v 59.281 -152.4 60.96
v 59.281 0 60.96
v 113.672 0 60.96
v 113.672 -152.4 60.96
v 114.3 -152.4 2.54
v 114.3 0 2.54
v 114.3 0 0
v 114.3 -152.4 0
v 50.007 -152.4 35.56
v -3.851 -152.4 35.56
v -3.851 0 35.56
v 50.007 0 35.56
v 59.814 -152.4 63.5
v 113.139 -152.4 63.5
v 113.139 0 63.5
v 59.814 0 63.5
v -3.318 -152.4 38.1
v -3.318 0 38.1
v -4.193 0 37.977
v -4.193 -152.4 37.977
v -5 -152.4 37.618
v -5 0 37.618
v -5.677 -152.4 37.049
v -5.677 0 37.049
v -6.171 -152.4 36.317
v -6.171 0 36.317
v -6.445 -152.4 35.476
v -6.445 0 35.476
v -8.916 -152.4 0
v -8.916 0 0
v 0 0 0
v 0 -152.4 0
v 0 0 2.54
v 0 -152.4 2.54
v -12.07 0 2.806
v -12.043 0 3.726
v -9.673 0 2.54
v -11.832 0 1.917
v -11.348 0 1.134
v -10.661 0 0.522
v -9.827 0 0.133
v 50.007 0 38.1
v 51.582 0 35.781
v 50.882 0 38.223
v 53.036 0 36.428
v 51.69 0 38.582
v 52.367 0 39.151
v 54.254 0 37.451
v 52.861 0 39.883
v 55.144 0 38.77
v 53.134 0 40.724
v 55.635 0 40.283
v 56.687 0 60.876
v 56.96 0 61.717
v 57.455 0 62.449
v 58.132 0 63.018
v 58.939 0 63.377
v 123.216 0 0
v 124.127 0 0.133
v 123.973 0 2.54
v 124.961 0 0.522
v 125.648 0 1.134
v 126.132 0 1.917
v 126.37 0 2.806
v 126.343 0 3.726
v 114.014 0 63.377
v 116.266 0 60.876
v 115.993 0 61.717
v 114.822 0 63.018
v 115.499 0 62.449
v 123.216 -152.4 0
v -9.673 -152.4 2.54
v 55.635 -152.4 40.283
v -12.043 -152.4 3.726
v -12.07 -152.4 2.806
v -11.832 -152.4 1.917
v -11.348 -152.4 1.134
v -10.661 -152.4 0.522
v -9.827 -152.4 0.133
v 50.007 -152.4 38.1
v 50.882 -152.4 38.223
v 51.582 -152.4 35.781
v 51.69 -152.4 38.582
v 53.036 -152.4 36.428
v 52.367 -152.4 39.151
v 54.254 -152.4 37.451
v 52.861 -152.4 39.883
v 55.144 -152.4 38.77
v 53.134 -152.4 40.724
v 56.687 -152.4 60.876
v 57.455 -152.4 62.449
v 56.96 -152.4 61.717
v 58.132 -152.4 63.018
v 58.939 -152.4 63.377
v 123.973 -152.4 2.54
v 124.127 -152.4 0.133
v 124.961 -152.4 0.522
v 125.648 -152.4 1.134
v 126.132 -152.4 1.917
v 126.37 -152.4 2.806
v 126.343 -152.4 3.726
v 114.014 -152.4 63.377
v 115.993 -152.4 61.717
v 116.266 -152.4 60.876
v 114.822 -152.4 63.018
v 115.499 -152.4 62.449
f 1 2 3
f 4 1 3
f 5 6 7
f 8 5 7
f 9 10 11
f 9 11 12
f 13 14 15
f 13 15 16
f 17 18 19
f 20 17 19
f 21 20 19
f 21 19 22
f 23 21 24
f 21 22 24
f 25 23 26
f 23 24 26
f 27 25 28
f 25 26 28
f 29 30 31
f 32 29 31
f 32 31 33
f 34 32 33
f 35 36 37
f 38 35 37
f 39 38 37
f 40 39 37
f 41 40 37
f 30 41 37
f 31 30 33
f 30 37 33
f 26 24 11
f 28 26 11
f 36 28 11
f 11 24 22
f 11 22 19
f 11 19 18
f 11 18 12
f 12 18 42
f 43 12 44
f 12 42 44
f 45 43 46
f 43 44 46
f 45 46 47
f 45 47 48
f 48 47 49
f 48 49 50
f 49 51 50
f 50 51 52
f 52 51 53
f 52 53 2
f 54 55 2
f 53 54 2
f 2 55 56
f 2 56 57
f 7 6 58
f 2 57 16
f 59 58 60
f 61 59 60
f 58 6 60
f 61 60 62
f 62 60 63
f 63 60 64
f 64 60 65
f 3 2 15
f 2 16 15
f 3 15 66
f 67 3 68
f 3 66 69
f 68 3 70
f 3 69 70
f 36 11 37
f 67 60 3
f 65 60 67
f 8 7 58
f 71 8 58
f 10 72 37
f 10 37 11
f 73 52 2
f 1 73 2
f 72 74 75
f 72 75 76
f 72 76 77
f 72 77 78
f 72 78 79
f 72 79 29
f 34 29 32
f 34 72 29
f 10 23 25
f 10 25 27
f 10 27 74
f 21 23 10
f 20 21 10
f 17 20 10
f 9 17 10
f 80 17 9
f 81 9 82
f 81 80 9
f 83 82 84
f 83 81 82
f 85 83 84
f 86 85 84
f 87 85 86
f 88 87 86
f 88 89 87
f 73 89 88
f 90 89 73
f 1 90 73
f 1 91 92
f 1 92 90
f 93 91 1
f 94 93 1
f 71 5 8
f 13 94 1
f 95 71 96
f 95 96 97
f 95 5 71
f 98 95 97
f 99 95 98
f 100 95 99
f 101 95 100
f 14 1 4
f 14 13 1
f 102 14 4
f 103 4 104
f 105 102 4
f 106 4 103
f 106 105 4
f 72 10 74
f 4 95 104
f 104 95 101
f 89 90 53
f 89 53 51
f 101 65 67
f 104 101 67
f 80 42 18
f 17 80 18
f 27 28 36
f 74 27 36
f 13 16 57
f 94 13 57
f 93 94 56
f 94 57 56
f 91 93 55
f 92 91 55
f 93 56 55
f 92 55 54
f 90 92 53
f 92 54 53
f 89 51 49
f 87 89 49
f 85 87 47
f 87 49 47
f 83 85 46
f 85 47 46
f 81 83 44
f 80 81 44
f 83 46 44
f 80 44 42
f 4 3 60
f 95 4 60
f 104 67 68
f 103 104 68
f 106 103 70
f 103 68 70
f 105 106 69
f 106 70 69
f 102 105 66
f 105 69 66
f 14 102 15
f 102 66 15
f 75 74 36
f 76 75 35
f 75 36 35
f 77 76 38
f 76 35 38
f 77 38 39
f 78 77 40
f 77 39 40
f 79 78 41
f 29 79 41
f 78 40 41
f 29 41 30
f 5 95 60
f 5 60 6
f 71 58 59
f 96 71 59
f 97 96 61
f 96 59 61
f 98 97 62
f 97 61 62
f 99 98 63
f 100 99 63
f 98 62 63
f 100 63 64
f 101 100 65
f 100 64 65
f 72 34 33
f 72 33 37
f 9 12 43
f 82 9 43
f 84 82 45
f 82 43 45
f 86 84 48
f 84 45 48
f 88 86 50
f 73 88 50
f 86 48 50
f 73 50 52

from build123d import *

# Parameters (mm, degrees)
F1_DEPTH = 152.4


with BuildPart() as f1:
    # F0 (on Front) → F1 (new body)
    with BuildSketch(Plane.XZ):
        with BuildLine():
            Line((-8.916182, 0), (0, 0))
            Line((0, 0), (0, 2.54))
            Line((0, 2.54), (-9.672946, 2.54))
            Line((-9.672946, 2.54), (-3.850629, 35.56))
            Line((-3.850629, 35.56), (50.007153, 35.56))
            ThreePointArc((50.007153, 35.56), (53.680685, 36.897056), (55.63533, 40.282601))
            Line((55.63533, 40.282601), (59.281313, 60.96))
            Line((59.281313, 60.96), (113.671924, 60.96))
            Line((113.671924, 60.96), (123.972946, 2.54))
            Line((123.972946, 2.54), (114.3, 2.54))
            Line((114.3, 2.54), (114.3, 0))
            Line((114.3, 0), (123.216182, 0))
            ThreePointArc((123.216182, 0), (125.648373, 1.134149), (126.342947, 3.726333))
            Line((126.342947, 3.726333), (116.26586, 60.876333))
            ThreePointArc((116.26586, 60.876333), (115.179946, 62.757191), (113.139095, 63.5))
            Line((113.139095, 63.5), (59.814141, 63.5))
            ThreePointArc((59.814141, 63.5), (57.773291, 62.757191), (56.687377, 60.876333))
            Line((56.687377, 60.876333), (53.133918, 40.723667))
            ThreePointArc((53.133918, 40.723667), (52.048004, 38.842809), (50.007153, 38.1))
            Line((50.007153, 38.1), (-3.317801, 38.1))
            ThreePointArc((-3.317801, 38.1), (-5.358651, 37.357191), (-6.444565, 35.476333))
            Line((-6.444565, 35.476333), (-12.042947, 3.726333))
            ThreePointArc((-12.042947, 3.726333), (-11.348373, 1.134149), (-8.916182, 0))
        make_face()
    extrude(amount=F1_DEPTH)


solid = f1.part
